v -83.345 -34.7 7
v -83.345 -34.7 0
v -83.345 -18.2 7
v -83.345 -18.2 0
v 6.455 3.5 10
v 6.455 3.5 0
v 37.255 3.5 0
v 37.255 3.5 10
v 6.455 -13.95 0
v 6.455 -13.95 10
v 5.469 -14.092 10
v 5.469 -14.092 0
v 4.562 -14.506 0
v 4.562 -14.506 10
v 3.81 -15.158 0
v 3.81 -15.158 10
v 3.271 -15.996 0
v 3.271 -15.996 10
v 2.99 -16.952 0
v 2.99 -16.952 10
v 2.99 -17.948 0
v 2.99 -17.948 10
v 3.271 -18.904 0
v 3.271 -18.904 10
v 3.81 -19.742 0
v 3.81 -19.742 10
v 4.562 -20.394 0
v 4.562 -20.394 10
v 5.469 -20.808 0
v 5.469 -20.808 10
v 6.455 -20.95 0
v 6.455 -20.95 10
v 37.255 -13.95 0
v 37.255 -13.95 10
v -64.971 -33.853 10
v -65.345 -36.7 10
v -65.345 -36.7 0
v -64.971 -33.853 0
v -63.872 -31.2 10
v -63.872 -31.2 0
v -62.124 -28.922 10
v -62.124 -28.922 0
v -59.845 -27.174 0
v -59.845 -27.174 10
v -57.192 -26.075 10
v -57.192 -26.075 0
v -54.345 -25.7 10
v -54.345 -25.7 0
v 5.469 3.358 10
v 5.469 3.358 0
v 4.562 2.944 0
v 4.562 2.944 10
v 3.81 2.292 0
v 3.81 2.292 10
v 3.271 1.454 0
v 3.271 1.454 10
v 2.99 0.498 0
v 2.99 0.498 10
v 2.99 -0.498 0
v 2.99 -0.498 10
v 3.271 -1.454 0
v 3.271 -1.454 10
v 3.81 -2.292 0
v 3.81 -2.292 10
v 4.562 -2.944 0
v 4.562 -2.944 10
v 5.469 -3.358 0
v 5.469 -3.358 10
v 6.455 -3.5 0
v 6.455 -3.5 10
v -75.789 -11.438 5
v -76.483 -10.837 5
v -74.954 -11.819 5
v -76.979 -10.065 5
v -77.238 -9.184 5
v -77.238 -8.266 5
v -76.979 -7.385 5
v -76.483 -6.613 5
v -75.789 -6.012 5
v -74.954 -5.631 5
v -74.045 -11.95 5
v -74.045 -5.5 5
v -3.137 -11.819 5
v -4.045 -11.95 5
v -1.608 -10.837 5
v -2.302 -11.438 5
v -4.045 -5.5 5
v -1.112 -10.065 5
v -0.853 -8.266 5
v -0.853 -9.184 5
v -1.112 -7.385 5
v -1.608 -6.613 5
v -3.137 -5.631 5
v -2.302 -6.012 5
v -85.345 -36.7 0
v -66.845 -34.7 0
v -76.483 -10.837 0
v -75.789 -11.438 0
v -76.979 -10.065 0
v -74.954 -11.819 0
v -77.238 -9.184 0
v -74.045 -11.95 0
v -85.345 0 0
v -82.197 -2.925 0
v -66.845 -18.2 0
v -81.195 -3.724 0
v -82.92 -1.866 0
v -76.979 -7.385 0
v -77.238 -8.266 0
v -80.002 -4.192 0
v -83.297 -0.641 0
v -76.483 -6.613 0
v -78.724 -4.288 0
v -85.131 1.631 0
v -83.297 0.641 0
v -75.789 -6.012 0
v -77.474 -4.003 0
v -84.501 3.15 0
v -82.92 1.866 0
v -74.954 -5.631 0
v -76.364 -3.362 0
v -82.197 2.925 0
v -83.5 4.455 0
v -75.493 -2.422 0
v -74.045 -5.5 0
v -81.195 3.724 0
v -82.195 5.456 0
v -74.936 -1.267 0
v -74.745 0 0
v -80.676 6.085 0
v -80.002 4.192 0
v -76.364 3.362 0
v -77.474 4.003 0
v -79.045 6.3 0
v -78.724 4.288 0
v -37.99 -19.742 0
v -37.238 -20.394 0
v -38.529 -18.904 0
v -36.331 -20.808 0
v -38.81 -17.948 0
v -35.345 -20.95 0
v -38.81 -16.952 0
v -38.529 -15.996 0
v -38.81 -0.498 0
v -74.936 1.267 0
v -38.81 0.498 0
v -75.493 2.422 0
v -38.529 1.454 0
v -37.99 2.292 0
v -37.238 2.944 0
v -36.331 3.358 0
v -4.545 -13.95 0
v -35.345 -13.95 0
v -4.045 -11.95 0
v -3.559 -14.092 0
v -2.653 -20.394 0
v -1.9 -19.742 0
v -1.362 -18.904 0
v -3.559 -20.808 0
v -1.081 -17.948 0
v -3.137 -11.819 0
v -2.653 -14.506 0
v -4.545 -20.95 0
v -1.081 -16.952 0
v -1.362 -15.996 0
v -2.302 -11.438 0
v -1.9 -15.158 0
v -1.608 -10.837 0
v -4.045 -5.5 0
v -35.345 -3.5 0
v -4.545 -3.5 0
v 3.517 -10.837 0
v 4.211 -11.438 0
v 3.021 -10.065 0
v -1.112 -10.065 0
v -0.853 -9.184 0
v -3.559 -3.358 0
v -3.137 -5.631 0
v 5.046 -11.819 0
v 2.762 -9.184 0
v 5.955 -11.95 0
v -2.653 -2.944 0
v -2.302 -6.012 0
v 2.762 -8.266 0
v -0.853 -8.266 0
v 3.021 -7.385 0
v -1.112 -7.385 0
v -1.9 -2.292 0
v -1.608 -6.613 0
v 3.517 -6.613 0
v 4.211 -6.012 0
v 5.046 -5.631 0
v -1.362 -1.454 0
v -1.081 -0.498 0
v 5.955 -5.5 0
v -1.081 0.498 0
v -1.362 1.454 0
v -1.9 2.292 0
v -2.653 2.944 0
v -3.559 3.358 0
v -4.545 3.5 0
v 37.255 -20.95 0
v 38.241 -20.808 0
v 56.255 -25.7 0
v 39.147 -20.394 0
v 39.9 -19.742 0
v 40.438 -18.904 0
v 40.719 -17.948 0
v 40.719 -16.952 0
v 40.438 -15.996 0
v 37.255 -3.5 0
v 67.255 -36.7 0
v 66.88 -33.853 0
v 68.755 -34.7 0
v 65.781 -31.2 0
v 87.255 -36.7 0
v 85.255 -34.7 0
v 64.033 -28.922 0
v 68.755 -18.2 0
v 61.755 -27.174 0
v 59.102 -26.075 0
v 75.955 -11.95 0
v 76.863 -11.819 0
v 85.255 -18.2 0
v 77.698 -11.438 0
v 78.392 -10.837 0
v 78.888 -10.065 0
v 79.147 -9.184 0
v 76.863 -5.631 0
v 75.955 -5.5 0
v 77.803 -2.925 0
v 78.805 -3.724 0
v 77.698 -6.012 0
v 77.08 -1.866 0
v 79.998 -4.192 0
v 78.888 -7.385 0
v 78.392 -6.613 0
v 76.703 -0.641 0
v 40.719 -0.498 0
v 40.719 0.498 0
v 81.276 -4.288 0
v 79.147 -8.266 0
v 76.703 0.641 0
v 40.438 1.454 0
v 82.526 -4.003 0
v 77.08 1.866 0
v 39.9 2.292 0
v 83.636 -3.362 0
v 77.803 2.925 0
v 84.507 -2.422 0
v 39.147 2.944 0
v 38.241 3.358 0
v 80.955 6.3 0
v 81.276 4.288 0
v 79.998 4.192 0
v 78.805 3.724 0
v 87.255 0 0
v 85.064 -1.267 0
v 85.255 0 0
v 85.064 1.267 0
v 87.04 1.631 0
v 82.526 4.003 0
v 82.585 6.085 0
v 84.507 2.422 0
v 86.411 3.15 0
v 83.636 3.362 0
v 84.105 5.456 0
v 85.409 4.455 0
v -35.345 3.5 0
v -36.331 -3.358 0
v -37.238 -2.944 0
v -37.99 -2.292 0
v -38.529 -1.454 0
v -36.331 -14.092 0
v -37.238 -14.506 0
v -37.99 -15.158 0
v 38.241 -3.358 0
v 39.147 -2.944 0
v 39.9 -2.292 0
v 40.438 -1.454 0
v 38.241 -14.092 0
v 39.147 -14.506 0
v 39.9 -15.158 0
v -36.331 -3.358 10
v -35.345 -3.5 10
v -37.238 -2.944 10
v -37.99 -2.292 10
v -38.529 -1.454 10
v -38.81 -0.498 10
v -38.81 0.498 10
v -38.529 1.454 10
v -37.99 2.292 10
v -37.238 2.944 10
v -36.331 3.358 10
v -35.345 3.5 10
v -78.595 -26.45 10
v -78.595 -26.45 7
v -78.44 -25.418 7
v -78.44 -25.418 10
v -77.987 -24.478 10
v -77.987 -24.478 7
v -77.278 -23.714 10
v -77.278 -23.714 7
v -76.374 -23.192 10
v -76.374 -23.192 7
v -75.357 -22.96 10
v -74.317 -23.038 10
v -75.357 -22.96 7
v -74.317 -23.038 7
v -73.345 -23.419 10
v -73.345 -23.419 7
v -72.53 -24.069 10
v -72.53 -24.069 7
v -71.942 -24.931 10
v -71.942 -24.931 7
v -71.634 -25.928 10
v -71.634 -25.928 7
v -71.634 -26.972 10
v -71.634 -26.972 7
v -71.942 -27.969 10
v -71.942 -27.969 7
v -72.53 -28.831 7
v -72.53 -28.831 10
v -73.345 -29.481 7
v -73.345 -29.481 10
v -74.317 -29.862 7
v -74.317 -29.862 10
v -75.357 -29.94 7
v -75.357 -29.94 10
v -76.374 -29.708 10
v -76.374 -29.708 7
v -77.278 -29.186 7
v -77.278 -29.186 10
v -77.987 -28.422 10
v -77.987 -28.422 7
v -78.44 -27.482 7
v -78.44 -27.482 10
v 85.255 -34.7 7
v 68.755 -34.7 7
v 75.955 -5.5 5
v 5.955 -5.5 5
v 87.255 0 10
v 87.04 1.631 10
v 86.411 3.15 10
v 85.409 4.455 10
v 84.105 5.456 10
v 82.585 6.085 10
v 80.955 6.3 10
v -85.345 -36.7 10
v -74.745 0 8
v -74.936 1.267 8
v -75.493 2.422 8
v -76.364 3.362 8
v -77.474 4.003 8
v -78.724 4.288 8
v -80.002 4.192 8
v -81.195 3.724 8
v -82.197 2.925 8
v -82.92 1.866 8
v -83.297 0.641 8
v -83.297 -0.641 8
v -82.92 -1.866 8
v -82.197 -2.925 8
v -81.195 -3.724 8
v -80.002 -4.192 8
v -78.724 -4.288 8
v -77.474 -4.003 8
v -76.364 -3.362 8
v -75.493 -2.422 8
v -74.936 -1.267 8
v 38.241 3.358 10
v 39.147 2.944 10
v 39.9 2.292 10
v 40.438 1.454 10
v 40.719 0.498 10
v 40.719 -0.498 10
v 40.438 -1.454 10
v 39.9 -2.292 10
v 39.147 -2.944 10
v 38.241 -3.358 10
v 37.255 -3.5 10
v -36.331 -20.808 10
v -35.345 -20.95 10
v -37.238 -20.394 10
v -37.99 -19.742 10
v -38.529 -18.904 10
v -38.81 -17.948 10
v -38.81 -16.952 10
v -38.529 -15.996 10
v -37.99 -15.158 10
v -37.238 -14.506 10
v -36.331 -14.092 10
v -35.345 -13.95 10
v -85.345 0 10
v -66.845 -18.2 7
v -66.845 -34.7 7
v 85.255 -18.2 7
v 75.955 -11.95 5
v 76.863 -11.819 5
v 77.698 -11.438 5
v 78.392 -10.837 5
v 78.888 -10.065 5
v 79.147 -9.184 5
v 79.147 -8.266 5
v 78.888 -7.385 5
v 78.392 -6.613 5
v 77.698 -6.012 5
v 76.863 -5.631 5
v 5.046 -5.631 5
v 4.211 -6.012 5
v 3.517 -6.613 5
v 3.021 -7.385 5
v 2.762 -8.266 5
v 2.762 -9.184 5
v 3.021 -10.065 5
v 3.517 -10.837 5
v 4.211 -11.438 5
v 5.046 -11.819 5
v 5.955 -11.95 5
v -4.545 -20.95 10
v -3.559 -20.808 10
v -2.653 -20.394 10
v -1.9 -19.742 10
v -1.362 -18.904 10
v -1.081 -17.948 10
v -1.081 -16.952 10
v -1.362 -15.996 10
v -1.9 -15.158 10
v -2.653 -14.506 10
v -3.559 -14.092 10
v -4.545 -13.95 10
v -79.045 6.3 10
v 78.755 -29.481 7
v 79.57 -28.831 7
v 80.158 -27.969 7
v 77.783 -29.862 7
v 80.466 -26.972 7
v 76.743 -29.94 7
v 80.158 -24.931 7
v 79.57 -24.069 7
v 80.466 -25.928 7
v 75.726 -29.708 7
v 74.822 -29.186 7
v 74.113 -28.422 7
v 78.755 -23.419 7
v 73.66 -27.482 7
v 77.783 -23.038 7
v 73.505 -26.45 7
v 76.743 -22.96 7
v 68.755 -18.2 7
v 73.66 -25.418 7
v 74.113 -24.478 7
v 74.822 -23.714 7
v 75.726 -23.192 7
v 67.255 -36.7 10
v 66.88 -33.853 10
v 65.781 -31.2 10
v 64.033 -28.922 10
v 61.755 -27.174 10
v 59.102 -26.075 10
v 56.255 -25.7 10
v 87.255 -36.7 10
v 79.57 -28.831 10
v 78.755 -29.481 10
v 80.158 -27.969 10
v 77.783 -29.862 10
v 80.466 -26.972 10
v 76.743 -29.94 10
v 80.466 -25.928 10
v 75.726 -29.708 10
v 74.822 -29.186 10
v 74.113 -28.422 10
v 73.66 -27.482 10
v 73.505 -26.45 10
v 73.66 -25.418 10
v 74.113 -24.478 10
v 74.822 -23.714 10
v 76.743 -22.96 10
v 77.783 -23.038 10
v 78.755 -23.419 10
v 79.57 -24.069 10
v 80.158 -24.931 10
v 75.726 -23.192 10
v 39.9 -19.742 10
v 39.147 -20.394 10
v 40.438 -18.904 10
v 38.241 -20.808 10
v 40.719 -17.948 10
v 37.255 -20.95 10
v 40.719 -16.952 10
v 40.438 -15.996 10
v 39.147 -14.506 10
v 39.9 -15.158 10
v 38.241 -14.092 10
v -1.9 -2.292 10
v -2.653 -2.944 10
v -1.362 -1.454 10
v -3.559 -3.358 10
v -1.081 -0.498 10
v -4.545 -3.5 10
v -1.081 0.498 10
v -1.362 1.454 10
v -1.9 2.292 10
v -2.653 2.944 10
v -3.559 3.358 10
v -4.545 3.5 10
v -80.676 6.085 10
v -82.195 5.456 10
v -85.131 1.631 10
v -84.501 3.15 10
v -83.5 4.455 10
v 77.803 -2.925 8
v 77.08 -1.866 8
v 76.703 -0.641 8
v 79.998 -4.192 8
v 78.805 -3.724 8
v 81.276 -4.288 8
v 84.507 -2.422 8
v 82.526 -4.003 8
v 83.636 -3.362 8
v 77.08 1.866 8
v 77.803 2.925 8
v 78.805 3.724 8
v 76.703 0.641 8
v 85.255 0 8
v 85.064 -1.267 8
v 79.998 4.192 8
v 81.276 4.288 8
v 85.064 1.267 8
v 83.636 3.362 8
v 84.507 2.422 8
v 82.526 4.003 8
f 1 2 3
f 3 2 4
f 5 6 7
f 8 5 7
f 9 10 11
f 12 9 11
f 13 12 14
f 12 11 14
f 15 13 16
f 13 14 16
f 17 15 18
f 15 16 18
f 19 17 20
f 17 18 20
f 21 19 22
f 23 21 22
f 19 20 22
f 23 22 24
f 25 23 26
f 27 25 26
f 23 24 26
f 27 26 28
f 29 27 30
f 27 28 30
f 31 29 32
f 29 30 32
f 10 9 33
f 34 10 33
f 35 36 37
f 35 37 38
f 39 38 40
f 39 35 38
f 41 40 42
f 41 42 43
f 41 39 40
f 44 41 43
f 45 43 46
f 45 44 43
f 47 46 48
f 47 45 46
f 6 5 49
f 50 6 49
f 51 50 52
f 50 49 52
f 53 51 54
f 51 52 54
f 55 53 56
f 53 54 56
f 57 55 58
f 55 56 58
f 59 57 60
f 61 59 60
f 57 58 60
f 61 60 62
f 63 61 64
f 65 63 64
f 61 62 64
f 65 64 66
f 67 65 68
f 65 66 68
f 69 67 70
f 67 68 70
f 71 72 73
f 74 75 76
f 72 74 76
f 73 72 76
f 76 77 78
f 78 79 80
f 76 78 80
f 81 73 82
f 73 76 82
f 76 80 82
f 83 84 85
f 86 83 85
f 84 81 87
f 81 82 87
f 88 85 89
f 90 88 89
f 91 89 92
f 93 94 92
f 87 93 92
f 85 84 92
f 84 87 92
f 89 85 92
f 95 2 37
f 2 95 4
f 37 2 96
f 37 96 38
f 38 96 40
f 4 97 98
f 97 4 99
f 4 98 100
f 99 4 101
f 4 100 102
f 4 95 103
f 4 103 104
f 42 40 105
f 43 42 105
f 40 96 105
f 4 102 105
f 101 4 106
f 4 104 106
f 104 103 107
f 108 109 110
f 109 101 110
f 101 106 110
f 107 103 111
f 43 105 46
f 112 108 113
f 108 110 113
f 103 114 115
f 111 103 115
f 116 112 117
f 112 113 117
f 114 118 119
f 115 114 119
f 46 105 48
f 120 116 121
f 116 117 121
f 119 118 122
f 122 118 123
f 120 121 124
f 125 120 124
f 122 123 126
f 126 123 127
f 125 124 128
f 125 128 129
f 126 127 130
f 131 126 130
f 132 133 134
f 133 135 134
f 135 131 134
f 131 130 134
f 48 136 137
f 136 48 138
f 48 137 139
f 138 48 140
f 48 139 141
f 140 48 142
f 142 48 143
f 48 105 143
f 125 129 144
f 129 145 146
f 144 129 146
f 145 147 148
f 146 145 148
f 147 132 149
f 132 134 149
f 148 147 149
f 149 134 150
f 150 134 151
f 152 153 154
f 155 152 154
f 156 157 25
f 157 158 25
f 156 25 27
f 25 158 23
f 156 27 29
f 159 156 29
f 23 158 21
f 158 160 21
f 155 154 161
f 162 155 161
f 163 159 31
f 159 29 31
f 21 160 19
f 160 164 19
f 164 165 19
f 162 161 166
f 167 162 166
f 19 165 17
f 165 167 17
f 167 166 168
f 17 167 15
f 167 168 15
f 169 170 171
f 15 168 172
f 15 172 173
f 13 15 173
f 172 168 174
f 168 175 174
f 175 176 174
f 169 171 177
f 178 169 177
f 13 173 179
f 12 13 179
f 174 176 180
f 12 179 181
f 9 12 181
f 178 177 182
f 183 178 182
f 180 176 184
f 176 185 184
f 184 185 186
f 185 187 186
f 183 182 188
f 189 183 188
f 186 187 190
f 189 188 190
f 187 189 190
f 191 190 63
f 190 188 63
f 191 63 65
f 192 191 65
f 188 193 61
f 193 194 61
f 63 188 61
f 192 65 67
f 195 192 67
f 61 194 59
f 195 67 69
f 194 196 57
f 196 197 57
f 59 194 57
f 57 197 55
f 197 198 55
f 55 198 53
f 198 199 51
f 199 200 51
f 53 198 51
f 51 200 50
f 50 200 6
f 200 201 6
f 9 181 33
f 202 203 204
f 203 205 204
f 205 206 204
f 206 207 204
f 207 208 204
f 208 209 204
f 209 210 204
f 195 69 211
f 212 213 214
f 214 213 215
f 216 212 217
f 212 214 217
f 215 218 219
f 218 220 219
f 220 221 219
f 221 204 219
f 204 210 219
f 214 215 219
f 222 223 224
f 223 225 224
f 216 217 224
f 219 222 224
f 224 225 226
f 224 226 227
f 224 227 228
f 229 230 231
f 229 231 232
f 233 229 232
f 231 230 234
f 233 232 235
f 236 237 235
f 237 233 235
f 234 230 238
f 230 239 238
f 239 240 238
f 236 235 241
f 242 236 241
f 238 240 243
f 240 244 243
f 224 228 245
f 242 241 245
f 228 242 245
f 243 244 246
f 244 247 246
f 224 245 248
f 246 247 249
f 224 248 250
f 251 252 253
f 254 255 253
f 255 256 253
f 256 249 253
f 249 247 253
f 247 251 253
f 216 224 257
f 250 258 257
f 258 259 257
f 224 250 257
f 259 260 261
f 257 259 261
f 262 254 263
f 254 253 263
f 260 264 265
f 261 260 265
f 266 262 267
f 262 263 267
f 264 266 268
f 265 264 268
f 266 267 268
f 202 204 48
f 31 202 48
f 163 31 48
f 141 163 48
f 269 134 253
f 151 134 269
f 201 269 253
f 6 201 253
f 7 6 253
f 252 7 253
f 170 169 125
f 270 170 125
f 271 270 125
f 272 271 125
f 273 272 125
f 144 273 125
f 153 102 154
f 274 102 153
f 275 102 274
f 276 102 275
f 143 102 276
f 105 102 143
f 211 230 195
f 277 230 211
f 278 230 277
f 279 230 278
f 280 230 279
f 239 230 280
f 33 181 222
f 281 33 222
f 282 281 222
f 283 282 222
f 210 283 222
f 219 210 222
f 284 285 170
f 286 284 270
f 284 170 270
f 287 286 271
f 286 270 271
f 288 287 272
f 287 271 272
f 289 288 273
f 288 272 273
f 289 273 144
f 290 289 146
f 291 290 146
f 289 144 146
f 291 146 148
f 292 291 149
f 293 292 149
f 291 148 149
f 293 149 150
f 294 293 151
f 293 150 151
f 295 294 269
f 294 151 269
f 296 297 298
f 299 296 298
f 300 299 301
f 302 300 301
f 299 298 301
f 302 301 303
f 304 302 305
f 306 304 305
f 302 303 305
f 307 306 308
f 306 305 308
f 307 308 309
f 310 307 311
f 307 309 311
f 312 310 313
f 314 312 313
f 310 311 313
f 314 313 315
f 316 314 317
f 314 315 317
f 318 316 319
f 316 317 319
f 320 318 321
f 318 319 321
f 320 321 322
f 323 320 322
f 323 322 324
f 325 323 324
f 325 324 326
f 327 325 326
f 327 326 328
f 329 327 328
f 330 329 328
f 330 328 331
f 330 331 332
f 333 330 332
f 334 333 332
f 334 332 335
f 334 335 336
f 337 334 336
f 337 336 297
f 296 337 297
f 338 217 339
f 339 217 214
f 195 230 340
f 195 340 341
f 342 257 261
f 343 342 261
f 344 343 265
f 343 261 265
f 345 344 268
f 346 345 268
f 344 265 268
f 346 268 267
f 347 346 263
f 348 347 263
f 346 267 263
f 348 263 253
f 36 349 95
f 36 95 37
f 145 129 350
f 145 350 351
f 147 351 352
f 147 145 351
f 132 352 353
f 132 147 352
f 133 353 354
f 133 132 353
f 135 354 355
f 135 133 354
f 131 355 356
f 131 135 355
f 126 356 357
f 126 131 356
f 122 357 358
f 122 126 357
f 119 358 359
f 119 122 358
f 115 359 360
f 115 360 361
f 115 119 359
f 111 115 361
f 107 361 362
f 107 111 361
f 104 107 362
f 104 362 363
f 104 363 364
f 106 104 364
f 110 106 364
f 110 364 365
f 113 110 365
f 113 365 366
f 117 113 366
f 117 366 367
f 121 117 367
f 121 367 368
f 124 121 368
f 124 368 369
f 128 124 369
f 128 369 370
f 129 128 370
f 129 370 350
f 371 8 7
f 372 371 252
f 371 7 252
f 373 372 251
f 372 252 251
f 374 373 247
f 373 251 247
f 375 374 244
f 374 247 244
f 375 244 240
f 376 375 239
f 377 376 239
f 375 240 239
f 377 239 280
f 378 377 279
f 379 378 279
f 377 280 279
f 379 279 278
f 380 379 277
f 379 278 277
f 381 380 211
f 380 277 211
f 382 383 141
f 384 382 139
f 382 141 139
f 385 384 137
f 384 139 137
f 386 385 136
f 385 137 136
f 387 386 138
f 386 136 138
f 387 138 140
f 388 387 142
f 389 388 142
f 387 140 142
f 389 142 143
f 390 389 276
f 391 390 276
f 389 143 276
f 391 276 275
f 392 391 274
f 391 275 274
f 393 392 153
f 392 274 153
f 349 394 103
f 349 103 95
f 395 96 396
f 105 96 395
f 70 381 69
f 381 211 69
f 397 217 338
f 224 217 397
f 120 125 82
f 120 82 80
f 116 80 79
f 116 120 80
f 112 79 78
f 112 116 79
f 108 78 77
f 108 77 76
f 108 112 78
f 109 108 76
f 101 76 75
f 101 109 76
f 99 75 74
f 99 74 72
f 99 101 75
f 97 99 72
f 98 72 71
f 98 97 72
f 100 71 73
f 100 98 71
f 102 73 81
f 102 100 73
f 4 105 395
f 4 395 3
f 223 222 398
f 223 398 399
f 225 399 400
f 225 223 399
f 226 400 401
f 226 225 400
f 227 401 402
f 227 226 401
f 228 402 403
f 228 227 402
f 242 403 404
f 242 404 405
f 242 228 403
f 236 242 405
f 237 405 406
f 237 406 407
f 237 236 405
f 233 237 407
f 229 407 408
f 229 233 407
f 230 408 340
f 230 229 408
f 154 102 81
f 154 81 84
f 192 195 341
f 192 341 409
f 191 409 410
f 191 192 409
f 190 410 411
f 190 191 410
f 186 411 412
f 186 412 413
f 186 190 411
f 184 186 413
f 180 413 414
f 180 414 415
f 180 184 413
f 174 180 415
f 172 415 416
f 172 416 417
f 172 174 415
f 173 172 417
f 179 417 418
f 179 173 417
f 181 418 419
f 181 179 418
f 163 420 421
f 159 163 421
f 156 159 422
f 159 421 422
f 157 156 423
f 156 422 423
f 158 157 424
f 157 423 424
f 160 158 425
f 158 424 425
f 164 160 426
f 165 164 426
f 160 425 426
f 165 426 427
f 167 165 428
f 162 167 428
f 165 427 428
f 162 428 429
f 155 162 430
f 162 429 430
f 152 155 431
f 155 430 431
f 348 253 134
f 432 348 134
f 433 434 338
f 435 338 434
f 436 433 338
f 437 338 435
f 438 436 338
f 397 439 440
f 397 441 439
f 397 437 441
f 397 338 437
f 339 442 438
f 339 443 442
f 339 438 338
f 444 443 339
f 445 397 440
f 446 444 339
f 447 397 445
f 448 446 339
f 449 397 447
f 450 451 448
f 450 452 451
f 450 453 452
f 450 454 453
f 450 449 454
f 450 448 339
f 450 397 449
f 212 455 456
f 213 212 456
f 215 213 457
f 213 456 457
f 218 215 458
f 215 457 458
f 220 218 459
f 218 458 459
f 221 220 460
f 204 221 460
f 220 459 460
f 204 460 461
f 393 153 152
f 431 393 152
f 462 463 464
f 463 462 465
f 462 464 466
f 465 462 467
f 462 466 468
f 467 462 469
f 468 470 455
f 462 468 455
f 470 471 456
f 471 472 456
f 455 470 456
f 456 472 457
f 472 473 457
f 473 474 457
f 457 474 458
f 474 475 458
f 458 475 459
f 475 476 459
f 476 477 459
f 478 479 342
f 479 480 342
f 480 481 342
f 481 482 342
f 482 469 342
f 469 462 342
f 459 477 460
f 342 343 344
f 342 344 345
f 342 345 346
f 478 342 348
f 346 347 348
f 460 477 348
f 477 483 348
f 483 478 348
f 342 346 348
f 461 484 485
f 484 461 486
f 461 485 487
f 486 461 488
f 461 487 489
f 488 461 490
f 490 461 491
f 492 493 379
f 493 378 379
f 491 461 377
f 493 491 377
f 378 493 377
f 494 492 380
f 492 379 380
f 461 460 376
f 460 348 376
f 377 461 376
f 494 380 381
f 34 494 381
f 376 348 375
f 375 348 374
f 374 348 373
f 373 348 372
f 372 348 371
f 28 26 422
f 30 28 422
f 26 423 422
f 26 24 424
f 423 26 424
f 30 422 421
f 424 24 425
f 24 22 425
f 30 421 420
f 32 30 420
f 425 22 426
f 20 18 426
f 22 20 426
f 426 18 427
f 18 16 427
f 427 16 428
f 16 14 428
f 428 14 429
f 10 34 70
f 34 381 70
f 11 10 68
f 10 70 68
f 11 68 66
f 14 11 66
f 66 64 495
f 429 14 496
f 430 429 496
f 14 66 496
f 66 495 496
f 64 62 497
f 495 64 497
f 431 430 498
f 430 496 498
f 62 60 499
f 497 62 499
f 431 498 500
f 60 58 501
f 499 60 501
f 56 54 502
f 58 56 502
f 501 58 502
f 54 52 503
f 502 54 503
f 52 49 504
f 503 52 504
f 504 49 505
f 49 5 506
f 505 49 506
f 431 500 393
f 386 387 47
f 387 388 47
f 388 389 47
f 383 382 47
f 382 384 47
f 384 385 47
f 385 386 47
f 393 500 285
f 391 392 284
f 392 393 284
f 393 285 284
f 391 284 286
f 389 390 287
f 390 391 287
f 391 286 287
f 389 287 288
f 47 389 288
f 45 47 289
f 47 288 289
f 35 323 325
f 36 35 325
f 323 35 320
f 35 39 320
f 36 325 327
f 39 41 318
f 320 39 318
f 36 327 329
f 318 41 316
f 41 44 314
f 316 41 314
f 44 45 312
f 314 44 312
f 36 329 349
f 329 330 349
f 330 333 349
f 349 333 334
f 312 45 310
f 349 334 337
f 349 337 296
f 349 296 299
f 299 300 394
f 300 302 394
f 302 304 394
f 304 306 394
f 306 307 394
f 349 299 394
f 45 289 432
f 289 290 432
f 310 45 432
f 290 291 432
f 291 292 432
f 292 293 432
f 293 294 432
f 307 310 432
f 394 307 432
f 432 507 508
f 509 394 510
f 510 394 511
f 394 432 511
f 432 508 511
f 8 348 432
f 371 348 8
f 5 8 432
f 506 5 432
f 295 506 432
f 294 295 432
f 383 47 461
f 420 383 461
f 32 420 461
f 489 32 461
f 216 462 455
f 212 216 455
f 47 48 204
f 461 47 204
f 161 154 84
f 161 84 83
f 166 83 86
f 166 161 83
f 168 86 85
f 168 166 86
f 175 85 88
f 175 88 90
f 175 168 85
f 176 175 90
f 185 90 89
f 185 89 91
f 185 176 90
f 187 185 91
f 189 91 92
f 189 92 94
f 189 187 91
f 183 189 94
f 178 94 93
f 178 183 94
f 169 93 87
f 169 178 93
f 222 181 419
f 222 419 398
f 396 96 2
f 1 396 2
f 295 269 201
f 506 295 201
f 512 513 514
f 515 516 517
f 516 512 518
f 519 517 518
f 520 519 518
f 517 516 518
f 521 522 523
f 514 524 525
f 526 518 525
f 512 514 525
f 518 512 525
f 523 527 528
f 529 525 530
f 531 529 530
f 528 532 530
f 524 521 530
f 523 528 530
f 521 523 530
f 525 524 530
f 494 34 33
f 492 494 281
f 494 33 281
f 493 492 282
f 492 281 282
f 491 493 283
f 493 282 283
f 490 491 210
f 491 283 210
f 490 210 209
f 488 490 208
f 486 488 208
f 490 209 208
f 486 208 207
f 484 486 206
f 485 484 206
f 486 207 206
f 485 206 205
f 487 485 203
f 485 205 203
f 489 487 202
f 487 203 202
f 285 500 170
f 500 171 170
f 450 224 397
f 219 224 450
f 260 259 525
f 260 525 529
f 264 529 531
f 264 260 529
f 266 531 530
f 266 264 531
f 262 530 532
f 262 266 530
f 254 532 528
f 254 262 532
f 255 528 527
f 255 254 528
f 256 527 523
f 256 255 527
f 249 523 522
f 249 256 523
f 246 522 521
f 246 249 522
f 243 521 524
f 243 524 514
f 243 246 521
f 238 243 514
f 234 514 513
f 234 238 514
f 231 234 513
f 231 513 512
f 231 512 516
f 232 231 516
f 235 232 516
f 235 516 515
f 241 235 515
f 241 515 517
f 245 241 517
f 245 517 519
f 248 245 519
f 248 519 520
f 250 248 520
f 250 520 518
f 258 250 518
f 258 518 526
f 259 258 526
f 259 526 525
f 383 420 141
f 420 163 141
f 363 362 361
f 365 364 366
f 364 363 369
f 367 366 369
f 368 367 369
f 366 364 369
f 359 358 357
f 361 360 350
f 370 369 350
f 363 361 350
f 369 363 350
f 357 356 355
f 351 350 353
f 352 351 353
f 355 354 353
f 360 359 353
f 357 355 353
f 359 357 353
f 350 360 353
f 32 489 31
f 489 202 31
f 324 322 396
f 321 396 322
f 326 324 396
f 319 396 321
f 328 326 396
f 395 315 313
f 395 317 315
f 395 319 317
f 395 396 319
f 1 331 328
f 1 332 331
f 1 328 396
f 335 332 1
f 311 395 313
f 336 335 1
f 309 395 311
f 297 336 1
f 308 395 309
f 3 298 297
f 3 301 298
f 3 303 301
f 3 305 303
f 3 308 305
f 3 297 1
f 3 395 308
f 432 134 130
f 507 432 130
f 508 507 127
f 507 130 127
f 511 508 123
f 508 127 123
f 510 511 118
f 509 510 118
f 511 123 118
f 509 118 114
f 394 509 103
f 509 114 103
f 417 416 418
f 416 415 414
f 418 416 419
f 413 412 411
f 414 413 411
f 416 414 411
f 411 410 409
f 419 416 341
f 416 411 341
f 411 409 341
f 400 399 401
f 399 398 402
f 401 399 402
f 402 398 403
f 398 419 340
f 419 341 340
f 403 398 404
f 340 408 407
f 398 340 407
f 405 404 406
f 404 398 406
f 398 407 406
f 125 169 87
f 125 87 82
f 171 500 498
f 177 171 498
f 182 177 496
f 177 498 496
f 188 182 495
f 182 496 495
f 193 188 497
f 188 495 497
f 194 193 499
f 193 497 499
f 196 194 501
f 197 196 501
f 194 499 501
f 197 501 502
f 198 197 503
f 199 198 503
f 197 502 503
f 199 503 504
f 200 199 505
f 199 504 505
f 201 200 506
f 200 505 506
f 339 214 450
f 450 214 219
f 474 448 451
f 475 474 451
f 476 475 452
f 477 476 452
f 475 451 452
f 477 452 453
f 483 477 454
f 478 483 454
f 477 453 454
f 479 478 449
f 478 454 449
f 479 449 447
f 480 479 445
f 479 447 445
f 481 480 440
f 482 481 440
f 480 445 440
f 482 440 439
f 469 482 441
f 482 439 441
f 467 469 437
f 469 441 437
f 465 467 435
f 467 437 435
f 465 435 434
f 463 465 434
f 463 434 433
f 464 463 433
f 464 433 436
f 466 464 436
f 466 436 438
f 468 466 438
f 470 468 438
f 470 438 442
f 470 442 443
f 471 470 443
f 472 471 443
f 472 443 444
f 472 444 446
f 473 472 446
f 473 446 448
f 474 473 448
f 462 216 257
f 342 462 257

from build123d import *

# Parameters (mm, degrees)
SKETCH1_R               = 4.3
SKETCH1_W               = 12.5
SKETCH1_H               = 12.5
BOSS_EXTRUDE1_DEPTH     = 8
CUT_EXTRUDE1_DEPTH      = 8
SKETCH1_2_R             = 4.3
SKETCH1_2_W             = 12.5
SKETCH1_2_H             = 12.5
BOSS_EXTRUDE2_DEPTH     = 10
CUT_EXTRUDE2_DEPTH      = 3
CUT_EXTRUDE2_DEPTH_BACK = 9
SKETCH3_W               = 12.5
SKETCH3_H               = 12.5
BOSS_EXTRUDE3_DEPTH     = 2
SKETCH4_R               = 4.3
BOSS_EXTRUDE5_DEPTH     = 2
BOSS_EXTRUDE6_DEPTH     = 10
BOSS_EXTRUDE7_DEPTH     = 10
BOSS_EXTRUDE8_DEPTH     = 10
SKETCH8_W               = 18.12209128
SKETCH8_H               = 22.505010211
SKETCH8_W_2             = 16.915072938
SKETCH8_H_2             = 18.768490124
BOSS_EXTRUDE9_DEPTH     = 10
SKETCH12_W              = 16.5
SKETCH12_H              = 16.5
CUT_EXTRUDE6_DEPTH      = 7
SKETCH13_R              = 3.5
CUT_EXTRUDE7_DEPTH      = 7
CUT_EXTRUDE11_DEPTH     = 5


with BuildPart() as part:
    # Sketch1 → Boss-Extrude1 (new body)
    with BuildSketch(Plane.XY):
        with BuildLine():
            Line((-85.345346062, -25.7), (87.254653938, -25.7))
            Line((87.254653938, -25.7), (87.254653938, 0))
            ThreePointArc((87.254653938, 0), (85.409426659, 4.454772721), (80.954653938, 6.3))
            Line((80.954653938, 6.3), (-79.045346062, 6.3))
            ThreePointArc((-79.045346062, 6.3), (-83.500118784, 4.454772721), (-85.345346062, 0))
            Line((-85.345346062, 0), (-85.345346062, -25.7))
        make_face()
        with Locations((-79.045346062, 0)):
            Circle(SKETCH1_R, mode=Mode.SUBTRACT)
        with Locations((80.954653938, 0)):
            Circle(SKETCH1_R, mode=Mode.SUBTRACT)
        with Locations((-77.095346062, -17.45)):
            Rectangle(SKETCH1_W, SKETCH1_H, mode=Mode.SUBTRACT)
        with Locations((79.004653938, -17.45)):
            Rectangle(SKETCH1_W, SKETCH1_H, mode=Mode.SUBTRACT)
    extrude(amount=BOSS_EXTRUDE1_DEPTH)

    # Sketch2 → Cut-Extrude1 (cut)
    with BuildSketch(Plane.XY.offset(8)):
        with BuildLine():
            Line((-35.345346062, 3.5), (37.254653938, 3.5))
            ThreePointArc((37.254653938, 3.5), (40.754653938, 0), (37.254653938, -3.5))
            Line((37.254653938, -3.5), (-35.345346062, -3.5))
            ThreePointArc((-35.345346062, -3.5), (-38.845346062, 0), (-35.345346062, 3.5))
        make_face()
        with BuildLine():
            Line((-35.345346062, -13.95), (37.254653938, -13.95))
            ThreePointArc((37.254653938, -13.95), (40.754653938, -17.45), (37.254653938, -20.95))
            Line((37.254653938, -20.95), (34.643207431, -20.95))
            Line((34.643207431, -20.95), (-35.345346062, -20.95))
            ThreePointArc((-35.345346062, -20.95), (-38.845346062, -17.45), (-35.345346062, -13.95))
        make_face()
    extrude(amount=-CUT_EXTRUDE1_DEPTH, mode=Mode.SUBTRACT)

    # Sketch1<2> → Boss-Extrude2 (add)
    with BuildSketch(Plane.XY):
        with BuildLine():
            Line((-85.345346062, -25.7), (87.254653938, -25.7))
            Line((87.254653938, -25.7), (87.254653938, 0))
            ThreePointArc((87.254653938, 0), (85.409426659, 4.454772721), (80.954653938, 6.3))
            Line((80.954653938, 6.3), (-79.045346062, 6.3))
            ThreePointArc((-79.045346062, 6.3), (-83.500118784, 4.454772721), (-85.345346062, 0))
            Line((-85.345346062, 0), (-85.345346062, -25.7))
        make_face()
        with Locations((-79.045346062, 0)):
            Circle(SKETCH1_2_R, mode=Mode.SUBTRACT)
        with Locations((80.954653938, 0)):
            Circle(SKETCH1_2_R, mode=Mode.SUBTRACT)
        with Locations((-77.095346062, -17.45)):
            Rectangle(SKETCH1_2_W, SKETCH1_2_H, mode=Mode.SUBTRACT)
        with Locations((79.004653938, -17.45)):
            Rectangle(SKETCH1_2_W, SKETCH1_2_H, mode=Mode.SUBTRACT)
    extrude(amount=BOSS_EXTRUDE2_DEPTH)

    # Sketch2<2> → Cut-Extrude2 (cut, two sides)
    with BuildSketch(Plane.XY.offset(8)) as cut_extrude2_sk:
        with BuildLine():
            Line((-35.345346062, 3.5), (37.254653938, 3.5))
            ThreePointArc((37.254653938, 3.5), (40.754653938, 0), (37.254653938, -3.5))
            Line((37.254653938, -3.5), (-35.345346062, -3.5))
            ThreePointArc((-35.345346062, -3.5), (-38.845346062, 0), (-35.345346062, 3.5))
        make_face()
        with BuildLine():
            Line((-35.345346062, -13.95), (37.254653938, -13.95))
            ThreePointArc((37.254653938, -13.95), (40.754653938, -17.45), (37.254653938, -20.95))
            Line((37.254653938, -20.95), (34.643207431, -20.95))
            Line((34.643207431, -20.95), (-35.345346062, -20.95))
            ThreePointArc((-35.345346062, -20.95), (-38.845346062, -17.45), (-35.345346062, -13.95))
        make_face()
    extrude(amount=CUT_EXTRUDE2_DEPTH, mode=Mode.SUBTRACT)
    extrude(cut_extrude2_sk.sketch, amount=-CUT_EXTRUDE2_DEPTH_BACK, mode=Mode.SUBTRACT)

    # Sketch3 → Boss-Extrude3 (add)
    with BuildSketch(Plane.XY.offset(10)):
        with Locations((-77.095346062, -17.45)):
            Rectangle(SKETCH3_W, SKETCH3_H)
        with Locations((79.004653938, -17.45)):
            Rectangle(SKETCH3_W, SKETCH3_H)
    extrude(amount=-BOSS_EXTRUDE3_DEPTH)

    # Sketch4 → Boss-Extrude5 (add)
    with BuildSketch(Plane.XY.offset(10)):
        with Locations((-79.045346062, 0)):
            Circle(SKETCH4_R)
        with Locations((80.954653938, 0)):
            Circle(SKETCH4_R)
    extrude(amount=-BOSS_EXTRUDE5_DEPTH)

    # Sketch5 → Boss-Extrude6 (add)
    with BuildSketch(Plane.XY.offset(10)):
        with BuildLine():
            Line((-4.545346062, 3.5), (6.454653938, 3.5))
            ThreePointArc((6.454653938, 3.5), (2.954653938, 0), (6.454653938, -3.5))
            Line((6.454653938, -3.5), (-4.545346062, -3.5))
            ThreePointArc((-4.545346062, -3.5), (-1.045346062, 0), (-4.545346062, 3.5))
        make_face()
    extrude(amount=-BOSS_EXTRUDE6_DEPTH)

    # Sketch6 → Boss-Extrude7 (add)
    with BuildSketch(Plane.XY.offset(10)):
        with BuildLine():
            Line((-4.545346062, -13.95), (6.454653938, -13.95))
            ThreePointArc((6.454653938, -13.95), (2.954653938, -17.45), (6.454653938, -20.95))
            Line((6.454653938, -20.95), (-4.545346062, -20.95))
            ThreePointArc((-4.545346062, -20.95), (-1.045346062, -17.45), (-4.545346062, -13.95))
        make_face()
    extrude(amount=-BOSS_EXTRUDE7_DEPTH)

    # Sketch7 → Boss-Extrude8 (add)
    with BuildSketch(Plane.XY.offset(10)):
        with BuildLine():
            Line((-85.345346062, -25.7), (-85.345346062, -36.7))
            Line((-85.345346062, -36.7), (-65.345346062, -36.7))
            ThreePointArc((-65.345346062, -36.7), (-62.123520655, -28.921825407), (-54.345346062, -25.7))
            Line((-54.345346062, -25.7), (-85.345346062, -25.7))
        make_face()
        with BuildLine():
            Line((87.254653938, -25.7), (87.254653938, -36.7))
            Line((87.254653938, -36.7), (67.254653938, -36.7))
            ThreePointArc((67.254653938, -36.7), (64.032828531, -28.921825407), (56.254653938, -25.7))
            Line((56.254653938, -25.7), (87.254653938, -25.7))
        make_face()
    extrude(amount=-BOSS_EXTRUDE8_DEPTH)

    # Sketch8 → Boss-Extrude9 (add)
    with BuildSketch(Plane(origin=(0, 0, 0), x_dir=(-1, 0, 0), z_dir=(0, 0, -1))):
        with Locations((-77.426938653, -19.427407937)):
            Rectangle(SKETCH8_W, SKETCH8_H)
        with Locations((75.829945686, -18.535840795)):
            Rectangle(SKETCH8_W_2, SKETCH8_H_2)
    extrude(amount=-BOSS_EXTRUDE9_DEPTH)

    # Sketch12 → Cut-Extrude6 (cut)
    with BuildSketch(Plane(origin=(0, 0, 0), x_dir=(-1, 0, 0), z_dir=(0, 0, -1))):
        with Locations((-77.004653938, -26.45)):
            Rectangle(SKETCH12_W, SKETCH12_H)
        with Locations((75.095346062, -26.45)):
            Rectangle(SKETCH12_W, SKETCH12_H)
    extrude(amount=-CUT_EXTRUDE6_DEPTH, mode=Mode.SUBTRACT)

    # Sketch13 → Cut-Extrude7 (cut)
    with BuildSketch(Plane(origin=(0, 0, 7), x_dir=(-1, 0, 0), z_dir=(0, 0, -1))):
        with Locations((75.095346062, -26.45)):
            Circle(SKETCH13_R)
        with Locations((-77.004653938, -26.45)):
            Circle(SKETCH13_R)
    extrude(amount=-CUT_EXTRUDE7_DEPTH, mode=Mode.SUBTRACT)

    # Sketch14 → Cut-Extrude11 (cut)
    with BuildSketch(Plane(origin=(0, 0, 0), x_dir=(-1, 0, 0), z_dir=(0, 0, -1))):
        with BuildLine():
            Line((-75.954653938, -5.5), (-5.954653938, -5.5))
            ThreePointArc((-5.954653938, -5.5), (-2.729653938, -8.725), (-5.954653938, -11.95))
            Line((-5.954653938, -11.95), (-75.954653938, -11.95))
            ThreePointArc((-75.954653938, -11.95), (-79.179653938, -8.725), (-75.954653938, -5.5))
        make_face()
        with BuildLine():
            Line((4.045346062, -5.5), (6.774875553, -5.5))
            Line((6.774875553, -5.5), (74.045346062, -5.5))
            ThreePointArc((74.045346062, -5.5), (77.270346062, -8.725), (74.045346062, -11.95))
            Line((74.045346062, -11.95), (4.045346062, -11.95))
            ThreePointArc((4.045346062, -11.95), (0.820346062, -8.725), (4.045346062, -5.5))
        make_face()
    extrude(amount=-CUT_EXTRUDE11_DEPTH, mode=Mode.SUBTRACT)


solid = part.part
